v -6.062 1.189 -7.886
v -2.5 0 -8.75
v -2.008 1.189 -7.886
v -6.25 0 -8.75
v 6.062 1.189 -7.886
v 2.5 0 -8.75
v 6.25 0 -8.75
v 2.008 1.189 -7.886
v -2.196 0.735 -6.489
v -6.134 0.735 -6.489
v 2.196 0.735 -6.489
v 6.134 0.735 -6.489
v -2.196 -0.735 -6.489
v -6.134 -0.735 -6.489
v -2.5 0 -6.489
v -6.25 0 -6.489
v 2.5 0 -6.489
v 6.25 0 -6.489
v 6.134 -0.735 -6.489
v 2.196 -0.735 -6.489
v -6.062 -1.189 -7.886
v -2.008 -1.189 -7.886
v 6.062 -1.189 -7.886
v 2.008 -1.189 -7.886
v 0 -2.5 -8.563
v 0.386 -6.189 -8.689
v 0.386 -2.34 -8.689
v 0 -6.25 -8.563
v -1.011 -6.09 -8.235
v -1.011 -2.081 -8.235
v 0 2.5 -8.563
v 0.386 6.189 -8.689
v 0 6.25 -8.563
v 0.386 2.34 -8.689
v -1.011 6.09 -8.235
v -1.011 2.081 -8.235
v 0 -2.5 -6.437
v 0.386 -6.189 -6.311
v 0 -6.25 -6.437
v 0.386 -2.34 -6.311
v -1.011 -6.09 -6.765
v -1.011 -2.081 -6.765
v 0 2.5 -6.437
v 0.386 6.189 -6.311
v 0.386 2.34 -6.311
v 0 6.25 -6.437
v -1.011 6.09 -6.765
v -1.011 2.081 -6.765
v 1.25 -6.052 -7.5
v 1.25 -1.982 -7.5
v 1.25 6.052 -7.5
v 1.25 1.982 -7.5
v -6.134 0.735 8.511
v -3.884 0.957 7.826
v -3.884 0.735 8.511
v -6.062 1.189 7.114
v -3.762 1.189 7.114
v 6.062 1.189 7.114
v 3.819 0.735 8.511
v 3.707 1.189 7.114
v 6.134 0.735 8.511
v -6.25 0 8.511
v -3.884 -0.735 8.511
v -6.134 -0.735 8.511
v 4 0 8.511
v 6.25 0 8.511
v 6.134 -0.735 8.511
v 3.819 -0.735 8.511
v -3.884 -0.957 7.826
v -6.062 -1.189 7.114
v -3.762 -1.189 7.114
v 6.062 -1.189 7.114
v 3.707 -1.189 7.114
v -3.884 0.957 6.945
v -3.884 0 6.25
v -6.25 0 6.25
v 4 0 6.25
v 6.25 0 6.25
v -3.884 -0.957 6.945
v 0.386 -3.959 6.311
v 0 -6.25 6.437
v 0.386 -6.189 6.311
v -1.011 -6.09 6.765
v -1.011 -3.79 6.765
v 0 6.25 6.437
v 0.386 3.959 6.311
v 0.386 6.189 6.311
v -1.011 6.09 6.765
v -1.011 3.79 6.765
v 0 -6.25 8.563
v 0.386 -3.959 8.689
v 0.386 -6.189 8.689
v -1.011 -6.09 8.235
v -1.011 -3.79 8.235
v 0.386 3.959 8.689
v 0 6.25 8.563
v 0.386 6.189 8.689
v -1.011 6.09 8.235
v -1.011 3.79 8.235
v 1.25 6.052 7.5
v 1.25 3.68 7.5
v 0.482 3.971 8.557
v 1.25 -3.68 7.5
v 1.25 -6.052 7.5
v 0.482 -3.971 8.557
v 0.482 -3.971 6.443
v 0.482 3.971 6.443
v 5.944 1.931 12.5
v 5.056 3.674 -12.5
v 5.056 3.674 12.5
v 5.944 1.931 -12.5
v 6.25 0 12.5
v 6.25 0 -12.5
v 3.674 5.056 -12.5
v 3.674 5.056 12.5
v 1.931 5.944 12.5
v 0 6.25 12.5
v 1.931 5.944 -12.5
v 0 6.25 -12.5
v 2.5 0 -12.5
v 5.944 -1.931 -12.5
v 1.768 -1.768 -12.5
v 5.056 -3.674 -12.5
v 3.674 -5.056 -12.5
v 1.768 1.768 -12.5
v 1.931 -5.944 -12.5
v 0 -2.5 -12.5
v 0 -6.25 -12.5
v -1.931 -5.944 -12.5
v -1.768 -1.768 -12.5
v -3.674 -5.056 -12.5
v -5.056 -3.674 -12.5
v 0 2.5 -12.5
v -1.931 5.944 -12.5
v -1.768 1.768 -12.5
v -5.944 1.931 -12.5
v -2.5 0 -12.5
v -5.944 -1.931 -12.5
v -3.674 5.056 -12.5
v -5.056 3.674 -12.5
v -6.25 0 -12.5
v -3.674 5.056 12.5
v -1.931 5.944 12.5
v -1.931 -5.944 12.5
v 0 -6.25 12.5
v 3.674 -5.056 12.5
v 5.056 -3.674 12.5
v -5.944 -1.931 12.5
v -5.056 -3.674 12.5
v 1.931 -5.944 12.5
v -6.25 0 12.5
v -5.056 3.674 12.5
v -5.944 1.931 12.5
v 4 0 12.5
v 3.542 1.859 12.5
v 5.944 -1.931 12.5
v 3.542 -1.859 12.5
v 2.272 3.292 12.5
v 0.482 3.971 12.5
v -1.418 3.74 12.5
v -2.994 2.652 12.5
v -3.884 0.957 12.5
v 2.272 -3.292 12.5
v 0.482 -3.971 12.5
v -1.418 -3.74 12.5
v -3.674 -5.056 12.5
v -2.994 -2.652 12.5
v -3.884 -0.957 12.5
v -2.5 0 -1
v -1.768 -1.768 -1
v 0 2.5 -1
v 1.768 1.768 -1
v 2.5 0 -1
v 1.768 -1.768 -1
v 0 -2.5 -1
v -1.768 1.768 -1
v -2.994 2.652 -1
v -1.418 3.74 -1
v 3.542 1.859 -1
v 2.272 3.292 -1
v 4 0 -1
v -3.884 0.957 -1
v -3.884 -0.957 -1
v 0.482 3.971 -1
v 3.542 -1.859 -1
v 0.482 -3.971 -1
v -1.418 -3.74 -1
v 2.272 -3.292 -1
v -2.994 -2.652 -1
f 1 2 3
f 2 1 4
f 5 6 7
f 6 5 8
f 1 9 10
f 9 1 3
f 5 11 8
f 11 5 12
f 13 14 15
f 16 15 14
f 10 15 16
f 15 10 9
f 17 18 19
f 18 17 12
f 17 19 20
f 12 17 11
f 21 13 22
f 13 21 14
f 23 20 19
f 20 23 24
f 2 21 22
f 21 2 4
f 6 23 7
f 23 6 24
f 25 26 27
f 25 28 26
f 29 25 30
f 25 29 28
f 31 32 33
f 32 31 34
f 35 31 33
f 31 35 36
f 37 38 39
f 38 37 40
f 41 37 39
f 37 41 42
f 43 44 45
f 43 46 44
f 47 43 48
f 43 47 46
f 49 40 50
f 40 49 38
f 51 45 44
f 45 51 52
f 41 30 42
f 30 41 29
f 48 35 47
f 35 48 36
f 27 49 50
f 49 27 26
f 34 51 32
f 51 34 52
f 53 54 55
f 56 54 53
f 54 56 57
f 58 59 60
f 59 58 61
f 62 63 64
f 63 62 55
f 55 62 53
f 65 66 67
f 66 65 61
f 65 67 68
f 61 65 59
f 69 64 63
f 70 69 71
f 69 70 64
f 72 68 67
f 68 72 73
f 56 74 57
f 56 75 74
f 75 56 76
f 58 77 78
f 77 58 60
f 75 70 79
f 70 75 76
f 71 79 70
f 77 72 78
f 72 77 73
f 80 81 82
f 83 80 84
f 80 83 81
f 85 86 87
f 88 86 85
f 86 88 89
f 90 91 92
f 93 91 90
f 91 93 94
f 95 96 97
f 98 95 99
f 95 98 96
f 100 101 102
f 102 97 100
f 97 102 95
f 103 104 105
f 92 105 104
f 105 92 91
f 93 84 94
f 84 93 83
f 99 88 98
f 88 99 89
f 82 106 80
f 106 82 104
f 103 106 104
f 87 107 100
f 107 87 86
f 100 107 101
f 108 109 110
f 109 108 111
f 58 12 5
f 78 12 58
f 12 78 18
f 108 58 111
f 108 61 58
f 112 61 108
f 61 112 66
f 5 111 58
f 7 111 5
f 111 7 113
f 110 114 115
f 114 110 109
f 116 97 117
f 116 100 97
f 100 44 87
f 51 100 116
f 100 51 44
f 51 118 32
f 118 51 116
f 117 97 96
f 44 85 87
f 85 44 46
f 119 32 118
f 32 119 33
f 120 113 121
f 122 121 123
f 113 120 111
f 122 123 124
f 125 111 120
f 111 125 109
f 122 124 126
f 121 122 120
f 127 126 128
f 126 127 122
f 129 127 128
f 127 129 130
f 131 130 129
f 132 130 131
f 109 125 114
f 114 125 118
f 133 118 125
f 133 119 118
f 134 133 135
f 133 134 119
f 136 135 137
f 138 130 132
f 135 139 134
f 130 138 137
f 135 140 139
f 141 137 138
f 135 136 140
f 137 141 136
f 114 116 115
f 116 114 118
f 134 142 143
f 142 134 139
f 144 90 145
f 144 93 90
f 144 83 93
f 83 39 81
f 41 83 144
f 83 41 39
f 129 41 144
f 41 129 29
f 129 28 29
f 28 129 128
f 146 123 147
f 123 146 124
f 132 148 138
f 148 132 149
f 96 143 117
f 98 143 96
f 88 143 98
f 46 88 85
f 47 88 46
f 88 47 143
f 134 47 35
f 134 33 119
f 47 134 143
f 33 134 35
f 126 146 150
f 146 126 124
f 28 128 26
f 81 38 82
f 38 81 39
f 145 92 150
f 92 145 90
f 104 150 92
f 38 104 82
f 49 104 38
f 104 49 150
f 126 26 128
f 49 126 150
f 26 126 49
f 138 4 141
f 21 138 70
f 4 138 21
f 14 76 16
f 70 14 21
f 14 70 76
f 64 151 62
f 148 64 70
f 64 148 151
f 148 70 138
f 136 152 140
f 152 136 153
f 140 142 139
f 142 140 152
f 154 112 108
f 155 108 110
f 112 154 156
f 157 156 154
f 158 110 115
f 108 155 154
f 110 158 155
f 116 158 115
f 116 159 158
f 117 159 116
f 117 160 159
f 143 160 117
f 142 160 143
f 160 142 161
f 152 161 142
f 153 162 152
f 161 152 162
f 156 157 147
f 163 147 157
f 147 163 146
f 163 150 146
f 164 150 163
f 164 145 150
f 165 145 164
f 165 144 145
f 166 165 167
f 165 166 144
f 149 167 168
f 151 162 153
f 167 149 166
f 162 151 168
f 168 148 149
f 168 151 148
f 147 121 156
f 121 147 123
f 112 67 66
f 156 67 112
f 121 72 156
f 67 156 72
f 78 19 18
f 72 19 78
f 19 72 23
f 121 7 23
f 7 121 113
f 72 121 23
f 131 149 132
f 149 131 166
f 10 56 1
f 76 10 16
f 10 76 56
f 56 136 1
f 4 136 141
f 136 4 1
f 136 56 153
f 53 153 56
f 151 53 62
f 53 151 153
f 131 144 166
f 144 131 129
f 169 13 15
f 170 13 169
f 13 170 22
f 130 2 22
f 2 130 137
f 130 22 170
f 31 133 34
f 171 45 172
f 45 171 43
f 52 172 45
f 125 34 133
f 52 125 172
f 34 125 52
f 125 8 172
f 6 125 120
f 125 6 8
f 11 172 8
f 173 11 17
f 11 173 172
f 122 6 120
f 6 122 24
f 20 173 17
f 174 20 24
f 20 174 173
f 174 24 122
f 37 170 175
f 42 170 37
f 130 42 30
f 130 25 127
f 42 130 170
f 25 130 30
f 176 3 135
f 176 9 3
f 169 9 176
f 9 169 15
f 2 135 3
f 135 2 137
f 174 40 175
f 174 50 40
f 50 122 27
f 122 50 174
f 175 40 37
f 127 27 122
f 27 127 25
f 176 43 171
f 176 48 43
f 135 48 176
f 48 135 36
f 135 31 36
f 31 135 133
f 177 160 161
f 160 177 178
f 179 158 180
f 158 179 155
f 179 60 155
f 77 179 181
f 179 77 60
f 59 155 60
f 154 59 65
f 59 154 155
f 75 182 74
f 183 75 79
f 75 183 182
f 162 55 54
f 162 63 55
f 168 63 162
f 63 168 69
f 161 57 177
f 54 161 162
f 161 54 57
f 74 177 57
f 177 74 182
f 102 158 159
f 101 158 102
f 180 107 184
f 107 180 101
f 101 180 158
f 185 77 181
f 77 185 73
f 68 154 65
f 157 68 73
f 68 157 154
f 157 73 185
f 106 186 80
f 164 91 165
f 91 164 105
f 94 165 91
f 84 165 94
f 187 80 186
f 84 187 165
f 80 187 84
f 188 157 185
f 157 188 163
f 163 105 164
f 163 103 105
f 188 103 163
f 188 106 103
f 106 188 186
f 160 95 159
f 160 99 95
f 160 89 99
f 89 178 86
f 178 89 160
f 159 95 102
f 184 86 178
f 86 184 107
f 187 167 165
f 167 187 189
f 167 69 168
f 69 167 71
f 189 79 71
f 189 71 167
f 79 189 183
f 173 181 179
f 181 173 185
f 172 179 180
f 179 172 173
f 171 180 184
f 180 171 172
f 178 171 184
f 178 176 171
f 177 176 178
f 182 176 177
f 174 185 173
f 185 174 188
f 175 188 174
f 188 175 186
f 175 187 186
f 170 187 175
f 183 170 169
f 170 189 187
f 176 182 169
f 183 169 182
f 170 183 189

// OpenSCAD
// Parameters
outer_diameter_mm = 12.5; //[6.25:25:0.1]
overall_length_mm = 25; //[12.5:50:0.1]
bore1_diameter_mm = 5; //[2.5:10:0.1]
bore2_diameter_mm = 8; //[4:16:0.1]
bore1_length_mm = 12.5; //[6.25:25:0.1]
bore2_length_mm = 12.5; //[6.25:25:0.1]
set_screw_enabled = 1; //[0:1:1]
set_screw_count_per_bore = 2; //[1:4:1]
set_screw_axial_offset_from_end_mm = 5; //[2.5:10:0.1]
set_screw_hole_diameter_mm = 2.5; //[1.5:4:0.1]
set_screw_hole_depth_extra_mm = 2; //[0.5:5:0.1]
overlap_mm = 1; //[0.5:2:0.1]

// Shaft Coupling - complete geometry
module shaft_coupling() {
  color("Silver") {
    difference() {
      // Coupling body
      cylinder(h=overall_length_mm, r=outer_diameter_mm/2, center=true);
      
      // Bore 1
      translate([0, 0, -overall_length_mm/2 + (bore1_length_mm + overlap_mm)/2])
        cylinder(h=bore1_length_mm + overlap_mm, r=bore1_diameter_mm/2, center=true);
      
      // Bore 2
      translate([0, 0, overall_length_mm/2 - (bore2_length_mm + overlap_mm)/2])
        cylinder(h=bore2_length_mm + overlap_mm, r=bore2_diameter_mm/2, center=true);
      
      // Set screw holes
      if (set_screw_enabled) {
        union() {
          // End 1, angle 0
          translate([0, 0, -overall_length_mm/2 + set_screw_axial_offset_from_end_mm])
            rotate([0, 90, 0])
            cylinder(h=outer_diameter_mm + 2*set_screw_hole_depth_extra_mm, r=set_screw_hole_diameter_mm/2, center=true);
          
          // End 1, angle 90
          translate([0, 0, -overall_length_mm/2 + set_screw_axial_offset_from_end_mm])
            rotate([90, 0, 0])
            cylinder(h=outer_diameter_mm + 2*set_screw_hole_depth_extra_mm, r=set_screw_hole_diameter_mm/2, center=true);
          
          // End 2, angle 0
          translate([0, 0, overall_length_mm/2 - set_screw_axial_offset_from_end_mm])
            rotate([0, 90, 0])
            cylinder(h=outer_diameter_mm + 2*set_screw_hole_depth_extra_mm, r=set_screw_hole_diameter_mm/2, center=true);
          
          // End 2, angle 90
          translate([0, 0, overall_length_mm/2 - set_screw_axial_offset_from_end_mm])
            rotate([90, 0, 0])
            cylinder(h=outer_diameter_mm + 2*set_screw_hole_depth_extra_mm, r=set_screw_hole_diameter_mm/2, center=true);
        }
      }
    }
  }
}

// Assembly
module assembly() {
  shaft_coupling();
}

assembly();
